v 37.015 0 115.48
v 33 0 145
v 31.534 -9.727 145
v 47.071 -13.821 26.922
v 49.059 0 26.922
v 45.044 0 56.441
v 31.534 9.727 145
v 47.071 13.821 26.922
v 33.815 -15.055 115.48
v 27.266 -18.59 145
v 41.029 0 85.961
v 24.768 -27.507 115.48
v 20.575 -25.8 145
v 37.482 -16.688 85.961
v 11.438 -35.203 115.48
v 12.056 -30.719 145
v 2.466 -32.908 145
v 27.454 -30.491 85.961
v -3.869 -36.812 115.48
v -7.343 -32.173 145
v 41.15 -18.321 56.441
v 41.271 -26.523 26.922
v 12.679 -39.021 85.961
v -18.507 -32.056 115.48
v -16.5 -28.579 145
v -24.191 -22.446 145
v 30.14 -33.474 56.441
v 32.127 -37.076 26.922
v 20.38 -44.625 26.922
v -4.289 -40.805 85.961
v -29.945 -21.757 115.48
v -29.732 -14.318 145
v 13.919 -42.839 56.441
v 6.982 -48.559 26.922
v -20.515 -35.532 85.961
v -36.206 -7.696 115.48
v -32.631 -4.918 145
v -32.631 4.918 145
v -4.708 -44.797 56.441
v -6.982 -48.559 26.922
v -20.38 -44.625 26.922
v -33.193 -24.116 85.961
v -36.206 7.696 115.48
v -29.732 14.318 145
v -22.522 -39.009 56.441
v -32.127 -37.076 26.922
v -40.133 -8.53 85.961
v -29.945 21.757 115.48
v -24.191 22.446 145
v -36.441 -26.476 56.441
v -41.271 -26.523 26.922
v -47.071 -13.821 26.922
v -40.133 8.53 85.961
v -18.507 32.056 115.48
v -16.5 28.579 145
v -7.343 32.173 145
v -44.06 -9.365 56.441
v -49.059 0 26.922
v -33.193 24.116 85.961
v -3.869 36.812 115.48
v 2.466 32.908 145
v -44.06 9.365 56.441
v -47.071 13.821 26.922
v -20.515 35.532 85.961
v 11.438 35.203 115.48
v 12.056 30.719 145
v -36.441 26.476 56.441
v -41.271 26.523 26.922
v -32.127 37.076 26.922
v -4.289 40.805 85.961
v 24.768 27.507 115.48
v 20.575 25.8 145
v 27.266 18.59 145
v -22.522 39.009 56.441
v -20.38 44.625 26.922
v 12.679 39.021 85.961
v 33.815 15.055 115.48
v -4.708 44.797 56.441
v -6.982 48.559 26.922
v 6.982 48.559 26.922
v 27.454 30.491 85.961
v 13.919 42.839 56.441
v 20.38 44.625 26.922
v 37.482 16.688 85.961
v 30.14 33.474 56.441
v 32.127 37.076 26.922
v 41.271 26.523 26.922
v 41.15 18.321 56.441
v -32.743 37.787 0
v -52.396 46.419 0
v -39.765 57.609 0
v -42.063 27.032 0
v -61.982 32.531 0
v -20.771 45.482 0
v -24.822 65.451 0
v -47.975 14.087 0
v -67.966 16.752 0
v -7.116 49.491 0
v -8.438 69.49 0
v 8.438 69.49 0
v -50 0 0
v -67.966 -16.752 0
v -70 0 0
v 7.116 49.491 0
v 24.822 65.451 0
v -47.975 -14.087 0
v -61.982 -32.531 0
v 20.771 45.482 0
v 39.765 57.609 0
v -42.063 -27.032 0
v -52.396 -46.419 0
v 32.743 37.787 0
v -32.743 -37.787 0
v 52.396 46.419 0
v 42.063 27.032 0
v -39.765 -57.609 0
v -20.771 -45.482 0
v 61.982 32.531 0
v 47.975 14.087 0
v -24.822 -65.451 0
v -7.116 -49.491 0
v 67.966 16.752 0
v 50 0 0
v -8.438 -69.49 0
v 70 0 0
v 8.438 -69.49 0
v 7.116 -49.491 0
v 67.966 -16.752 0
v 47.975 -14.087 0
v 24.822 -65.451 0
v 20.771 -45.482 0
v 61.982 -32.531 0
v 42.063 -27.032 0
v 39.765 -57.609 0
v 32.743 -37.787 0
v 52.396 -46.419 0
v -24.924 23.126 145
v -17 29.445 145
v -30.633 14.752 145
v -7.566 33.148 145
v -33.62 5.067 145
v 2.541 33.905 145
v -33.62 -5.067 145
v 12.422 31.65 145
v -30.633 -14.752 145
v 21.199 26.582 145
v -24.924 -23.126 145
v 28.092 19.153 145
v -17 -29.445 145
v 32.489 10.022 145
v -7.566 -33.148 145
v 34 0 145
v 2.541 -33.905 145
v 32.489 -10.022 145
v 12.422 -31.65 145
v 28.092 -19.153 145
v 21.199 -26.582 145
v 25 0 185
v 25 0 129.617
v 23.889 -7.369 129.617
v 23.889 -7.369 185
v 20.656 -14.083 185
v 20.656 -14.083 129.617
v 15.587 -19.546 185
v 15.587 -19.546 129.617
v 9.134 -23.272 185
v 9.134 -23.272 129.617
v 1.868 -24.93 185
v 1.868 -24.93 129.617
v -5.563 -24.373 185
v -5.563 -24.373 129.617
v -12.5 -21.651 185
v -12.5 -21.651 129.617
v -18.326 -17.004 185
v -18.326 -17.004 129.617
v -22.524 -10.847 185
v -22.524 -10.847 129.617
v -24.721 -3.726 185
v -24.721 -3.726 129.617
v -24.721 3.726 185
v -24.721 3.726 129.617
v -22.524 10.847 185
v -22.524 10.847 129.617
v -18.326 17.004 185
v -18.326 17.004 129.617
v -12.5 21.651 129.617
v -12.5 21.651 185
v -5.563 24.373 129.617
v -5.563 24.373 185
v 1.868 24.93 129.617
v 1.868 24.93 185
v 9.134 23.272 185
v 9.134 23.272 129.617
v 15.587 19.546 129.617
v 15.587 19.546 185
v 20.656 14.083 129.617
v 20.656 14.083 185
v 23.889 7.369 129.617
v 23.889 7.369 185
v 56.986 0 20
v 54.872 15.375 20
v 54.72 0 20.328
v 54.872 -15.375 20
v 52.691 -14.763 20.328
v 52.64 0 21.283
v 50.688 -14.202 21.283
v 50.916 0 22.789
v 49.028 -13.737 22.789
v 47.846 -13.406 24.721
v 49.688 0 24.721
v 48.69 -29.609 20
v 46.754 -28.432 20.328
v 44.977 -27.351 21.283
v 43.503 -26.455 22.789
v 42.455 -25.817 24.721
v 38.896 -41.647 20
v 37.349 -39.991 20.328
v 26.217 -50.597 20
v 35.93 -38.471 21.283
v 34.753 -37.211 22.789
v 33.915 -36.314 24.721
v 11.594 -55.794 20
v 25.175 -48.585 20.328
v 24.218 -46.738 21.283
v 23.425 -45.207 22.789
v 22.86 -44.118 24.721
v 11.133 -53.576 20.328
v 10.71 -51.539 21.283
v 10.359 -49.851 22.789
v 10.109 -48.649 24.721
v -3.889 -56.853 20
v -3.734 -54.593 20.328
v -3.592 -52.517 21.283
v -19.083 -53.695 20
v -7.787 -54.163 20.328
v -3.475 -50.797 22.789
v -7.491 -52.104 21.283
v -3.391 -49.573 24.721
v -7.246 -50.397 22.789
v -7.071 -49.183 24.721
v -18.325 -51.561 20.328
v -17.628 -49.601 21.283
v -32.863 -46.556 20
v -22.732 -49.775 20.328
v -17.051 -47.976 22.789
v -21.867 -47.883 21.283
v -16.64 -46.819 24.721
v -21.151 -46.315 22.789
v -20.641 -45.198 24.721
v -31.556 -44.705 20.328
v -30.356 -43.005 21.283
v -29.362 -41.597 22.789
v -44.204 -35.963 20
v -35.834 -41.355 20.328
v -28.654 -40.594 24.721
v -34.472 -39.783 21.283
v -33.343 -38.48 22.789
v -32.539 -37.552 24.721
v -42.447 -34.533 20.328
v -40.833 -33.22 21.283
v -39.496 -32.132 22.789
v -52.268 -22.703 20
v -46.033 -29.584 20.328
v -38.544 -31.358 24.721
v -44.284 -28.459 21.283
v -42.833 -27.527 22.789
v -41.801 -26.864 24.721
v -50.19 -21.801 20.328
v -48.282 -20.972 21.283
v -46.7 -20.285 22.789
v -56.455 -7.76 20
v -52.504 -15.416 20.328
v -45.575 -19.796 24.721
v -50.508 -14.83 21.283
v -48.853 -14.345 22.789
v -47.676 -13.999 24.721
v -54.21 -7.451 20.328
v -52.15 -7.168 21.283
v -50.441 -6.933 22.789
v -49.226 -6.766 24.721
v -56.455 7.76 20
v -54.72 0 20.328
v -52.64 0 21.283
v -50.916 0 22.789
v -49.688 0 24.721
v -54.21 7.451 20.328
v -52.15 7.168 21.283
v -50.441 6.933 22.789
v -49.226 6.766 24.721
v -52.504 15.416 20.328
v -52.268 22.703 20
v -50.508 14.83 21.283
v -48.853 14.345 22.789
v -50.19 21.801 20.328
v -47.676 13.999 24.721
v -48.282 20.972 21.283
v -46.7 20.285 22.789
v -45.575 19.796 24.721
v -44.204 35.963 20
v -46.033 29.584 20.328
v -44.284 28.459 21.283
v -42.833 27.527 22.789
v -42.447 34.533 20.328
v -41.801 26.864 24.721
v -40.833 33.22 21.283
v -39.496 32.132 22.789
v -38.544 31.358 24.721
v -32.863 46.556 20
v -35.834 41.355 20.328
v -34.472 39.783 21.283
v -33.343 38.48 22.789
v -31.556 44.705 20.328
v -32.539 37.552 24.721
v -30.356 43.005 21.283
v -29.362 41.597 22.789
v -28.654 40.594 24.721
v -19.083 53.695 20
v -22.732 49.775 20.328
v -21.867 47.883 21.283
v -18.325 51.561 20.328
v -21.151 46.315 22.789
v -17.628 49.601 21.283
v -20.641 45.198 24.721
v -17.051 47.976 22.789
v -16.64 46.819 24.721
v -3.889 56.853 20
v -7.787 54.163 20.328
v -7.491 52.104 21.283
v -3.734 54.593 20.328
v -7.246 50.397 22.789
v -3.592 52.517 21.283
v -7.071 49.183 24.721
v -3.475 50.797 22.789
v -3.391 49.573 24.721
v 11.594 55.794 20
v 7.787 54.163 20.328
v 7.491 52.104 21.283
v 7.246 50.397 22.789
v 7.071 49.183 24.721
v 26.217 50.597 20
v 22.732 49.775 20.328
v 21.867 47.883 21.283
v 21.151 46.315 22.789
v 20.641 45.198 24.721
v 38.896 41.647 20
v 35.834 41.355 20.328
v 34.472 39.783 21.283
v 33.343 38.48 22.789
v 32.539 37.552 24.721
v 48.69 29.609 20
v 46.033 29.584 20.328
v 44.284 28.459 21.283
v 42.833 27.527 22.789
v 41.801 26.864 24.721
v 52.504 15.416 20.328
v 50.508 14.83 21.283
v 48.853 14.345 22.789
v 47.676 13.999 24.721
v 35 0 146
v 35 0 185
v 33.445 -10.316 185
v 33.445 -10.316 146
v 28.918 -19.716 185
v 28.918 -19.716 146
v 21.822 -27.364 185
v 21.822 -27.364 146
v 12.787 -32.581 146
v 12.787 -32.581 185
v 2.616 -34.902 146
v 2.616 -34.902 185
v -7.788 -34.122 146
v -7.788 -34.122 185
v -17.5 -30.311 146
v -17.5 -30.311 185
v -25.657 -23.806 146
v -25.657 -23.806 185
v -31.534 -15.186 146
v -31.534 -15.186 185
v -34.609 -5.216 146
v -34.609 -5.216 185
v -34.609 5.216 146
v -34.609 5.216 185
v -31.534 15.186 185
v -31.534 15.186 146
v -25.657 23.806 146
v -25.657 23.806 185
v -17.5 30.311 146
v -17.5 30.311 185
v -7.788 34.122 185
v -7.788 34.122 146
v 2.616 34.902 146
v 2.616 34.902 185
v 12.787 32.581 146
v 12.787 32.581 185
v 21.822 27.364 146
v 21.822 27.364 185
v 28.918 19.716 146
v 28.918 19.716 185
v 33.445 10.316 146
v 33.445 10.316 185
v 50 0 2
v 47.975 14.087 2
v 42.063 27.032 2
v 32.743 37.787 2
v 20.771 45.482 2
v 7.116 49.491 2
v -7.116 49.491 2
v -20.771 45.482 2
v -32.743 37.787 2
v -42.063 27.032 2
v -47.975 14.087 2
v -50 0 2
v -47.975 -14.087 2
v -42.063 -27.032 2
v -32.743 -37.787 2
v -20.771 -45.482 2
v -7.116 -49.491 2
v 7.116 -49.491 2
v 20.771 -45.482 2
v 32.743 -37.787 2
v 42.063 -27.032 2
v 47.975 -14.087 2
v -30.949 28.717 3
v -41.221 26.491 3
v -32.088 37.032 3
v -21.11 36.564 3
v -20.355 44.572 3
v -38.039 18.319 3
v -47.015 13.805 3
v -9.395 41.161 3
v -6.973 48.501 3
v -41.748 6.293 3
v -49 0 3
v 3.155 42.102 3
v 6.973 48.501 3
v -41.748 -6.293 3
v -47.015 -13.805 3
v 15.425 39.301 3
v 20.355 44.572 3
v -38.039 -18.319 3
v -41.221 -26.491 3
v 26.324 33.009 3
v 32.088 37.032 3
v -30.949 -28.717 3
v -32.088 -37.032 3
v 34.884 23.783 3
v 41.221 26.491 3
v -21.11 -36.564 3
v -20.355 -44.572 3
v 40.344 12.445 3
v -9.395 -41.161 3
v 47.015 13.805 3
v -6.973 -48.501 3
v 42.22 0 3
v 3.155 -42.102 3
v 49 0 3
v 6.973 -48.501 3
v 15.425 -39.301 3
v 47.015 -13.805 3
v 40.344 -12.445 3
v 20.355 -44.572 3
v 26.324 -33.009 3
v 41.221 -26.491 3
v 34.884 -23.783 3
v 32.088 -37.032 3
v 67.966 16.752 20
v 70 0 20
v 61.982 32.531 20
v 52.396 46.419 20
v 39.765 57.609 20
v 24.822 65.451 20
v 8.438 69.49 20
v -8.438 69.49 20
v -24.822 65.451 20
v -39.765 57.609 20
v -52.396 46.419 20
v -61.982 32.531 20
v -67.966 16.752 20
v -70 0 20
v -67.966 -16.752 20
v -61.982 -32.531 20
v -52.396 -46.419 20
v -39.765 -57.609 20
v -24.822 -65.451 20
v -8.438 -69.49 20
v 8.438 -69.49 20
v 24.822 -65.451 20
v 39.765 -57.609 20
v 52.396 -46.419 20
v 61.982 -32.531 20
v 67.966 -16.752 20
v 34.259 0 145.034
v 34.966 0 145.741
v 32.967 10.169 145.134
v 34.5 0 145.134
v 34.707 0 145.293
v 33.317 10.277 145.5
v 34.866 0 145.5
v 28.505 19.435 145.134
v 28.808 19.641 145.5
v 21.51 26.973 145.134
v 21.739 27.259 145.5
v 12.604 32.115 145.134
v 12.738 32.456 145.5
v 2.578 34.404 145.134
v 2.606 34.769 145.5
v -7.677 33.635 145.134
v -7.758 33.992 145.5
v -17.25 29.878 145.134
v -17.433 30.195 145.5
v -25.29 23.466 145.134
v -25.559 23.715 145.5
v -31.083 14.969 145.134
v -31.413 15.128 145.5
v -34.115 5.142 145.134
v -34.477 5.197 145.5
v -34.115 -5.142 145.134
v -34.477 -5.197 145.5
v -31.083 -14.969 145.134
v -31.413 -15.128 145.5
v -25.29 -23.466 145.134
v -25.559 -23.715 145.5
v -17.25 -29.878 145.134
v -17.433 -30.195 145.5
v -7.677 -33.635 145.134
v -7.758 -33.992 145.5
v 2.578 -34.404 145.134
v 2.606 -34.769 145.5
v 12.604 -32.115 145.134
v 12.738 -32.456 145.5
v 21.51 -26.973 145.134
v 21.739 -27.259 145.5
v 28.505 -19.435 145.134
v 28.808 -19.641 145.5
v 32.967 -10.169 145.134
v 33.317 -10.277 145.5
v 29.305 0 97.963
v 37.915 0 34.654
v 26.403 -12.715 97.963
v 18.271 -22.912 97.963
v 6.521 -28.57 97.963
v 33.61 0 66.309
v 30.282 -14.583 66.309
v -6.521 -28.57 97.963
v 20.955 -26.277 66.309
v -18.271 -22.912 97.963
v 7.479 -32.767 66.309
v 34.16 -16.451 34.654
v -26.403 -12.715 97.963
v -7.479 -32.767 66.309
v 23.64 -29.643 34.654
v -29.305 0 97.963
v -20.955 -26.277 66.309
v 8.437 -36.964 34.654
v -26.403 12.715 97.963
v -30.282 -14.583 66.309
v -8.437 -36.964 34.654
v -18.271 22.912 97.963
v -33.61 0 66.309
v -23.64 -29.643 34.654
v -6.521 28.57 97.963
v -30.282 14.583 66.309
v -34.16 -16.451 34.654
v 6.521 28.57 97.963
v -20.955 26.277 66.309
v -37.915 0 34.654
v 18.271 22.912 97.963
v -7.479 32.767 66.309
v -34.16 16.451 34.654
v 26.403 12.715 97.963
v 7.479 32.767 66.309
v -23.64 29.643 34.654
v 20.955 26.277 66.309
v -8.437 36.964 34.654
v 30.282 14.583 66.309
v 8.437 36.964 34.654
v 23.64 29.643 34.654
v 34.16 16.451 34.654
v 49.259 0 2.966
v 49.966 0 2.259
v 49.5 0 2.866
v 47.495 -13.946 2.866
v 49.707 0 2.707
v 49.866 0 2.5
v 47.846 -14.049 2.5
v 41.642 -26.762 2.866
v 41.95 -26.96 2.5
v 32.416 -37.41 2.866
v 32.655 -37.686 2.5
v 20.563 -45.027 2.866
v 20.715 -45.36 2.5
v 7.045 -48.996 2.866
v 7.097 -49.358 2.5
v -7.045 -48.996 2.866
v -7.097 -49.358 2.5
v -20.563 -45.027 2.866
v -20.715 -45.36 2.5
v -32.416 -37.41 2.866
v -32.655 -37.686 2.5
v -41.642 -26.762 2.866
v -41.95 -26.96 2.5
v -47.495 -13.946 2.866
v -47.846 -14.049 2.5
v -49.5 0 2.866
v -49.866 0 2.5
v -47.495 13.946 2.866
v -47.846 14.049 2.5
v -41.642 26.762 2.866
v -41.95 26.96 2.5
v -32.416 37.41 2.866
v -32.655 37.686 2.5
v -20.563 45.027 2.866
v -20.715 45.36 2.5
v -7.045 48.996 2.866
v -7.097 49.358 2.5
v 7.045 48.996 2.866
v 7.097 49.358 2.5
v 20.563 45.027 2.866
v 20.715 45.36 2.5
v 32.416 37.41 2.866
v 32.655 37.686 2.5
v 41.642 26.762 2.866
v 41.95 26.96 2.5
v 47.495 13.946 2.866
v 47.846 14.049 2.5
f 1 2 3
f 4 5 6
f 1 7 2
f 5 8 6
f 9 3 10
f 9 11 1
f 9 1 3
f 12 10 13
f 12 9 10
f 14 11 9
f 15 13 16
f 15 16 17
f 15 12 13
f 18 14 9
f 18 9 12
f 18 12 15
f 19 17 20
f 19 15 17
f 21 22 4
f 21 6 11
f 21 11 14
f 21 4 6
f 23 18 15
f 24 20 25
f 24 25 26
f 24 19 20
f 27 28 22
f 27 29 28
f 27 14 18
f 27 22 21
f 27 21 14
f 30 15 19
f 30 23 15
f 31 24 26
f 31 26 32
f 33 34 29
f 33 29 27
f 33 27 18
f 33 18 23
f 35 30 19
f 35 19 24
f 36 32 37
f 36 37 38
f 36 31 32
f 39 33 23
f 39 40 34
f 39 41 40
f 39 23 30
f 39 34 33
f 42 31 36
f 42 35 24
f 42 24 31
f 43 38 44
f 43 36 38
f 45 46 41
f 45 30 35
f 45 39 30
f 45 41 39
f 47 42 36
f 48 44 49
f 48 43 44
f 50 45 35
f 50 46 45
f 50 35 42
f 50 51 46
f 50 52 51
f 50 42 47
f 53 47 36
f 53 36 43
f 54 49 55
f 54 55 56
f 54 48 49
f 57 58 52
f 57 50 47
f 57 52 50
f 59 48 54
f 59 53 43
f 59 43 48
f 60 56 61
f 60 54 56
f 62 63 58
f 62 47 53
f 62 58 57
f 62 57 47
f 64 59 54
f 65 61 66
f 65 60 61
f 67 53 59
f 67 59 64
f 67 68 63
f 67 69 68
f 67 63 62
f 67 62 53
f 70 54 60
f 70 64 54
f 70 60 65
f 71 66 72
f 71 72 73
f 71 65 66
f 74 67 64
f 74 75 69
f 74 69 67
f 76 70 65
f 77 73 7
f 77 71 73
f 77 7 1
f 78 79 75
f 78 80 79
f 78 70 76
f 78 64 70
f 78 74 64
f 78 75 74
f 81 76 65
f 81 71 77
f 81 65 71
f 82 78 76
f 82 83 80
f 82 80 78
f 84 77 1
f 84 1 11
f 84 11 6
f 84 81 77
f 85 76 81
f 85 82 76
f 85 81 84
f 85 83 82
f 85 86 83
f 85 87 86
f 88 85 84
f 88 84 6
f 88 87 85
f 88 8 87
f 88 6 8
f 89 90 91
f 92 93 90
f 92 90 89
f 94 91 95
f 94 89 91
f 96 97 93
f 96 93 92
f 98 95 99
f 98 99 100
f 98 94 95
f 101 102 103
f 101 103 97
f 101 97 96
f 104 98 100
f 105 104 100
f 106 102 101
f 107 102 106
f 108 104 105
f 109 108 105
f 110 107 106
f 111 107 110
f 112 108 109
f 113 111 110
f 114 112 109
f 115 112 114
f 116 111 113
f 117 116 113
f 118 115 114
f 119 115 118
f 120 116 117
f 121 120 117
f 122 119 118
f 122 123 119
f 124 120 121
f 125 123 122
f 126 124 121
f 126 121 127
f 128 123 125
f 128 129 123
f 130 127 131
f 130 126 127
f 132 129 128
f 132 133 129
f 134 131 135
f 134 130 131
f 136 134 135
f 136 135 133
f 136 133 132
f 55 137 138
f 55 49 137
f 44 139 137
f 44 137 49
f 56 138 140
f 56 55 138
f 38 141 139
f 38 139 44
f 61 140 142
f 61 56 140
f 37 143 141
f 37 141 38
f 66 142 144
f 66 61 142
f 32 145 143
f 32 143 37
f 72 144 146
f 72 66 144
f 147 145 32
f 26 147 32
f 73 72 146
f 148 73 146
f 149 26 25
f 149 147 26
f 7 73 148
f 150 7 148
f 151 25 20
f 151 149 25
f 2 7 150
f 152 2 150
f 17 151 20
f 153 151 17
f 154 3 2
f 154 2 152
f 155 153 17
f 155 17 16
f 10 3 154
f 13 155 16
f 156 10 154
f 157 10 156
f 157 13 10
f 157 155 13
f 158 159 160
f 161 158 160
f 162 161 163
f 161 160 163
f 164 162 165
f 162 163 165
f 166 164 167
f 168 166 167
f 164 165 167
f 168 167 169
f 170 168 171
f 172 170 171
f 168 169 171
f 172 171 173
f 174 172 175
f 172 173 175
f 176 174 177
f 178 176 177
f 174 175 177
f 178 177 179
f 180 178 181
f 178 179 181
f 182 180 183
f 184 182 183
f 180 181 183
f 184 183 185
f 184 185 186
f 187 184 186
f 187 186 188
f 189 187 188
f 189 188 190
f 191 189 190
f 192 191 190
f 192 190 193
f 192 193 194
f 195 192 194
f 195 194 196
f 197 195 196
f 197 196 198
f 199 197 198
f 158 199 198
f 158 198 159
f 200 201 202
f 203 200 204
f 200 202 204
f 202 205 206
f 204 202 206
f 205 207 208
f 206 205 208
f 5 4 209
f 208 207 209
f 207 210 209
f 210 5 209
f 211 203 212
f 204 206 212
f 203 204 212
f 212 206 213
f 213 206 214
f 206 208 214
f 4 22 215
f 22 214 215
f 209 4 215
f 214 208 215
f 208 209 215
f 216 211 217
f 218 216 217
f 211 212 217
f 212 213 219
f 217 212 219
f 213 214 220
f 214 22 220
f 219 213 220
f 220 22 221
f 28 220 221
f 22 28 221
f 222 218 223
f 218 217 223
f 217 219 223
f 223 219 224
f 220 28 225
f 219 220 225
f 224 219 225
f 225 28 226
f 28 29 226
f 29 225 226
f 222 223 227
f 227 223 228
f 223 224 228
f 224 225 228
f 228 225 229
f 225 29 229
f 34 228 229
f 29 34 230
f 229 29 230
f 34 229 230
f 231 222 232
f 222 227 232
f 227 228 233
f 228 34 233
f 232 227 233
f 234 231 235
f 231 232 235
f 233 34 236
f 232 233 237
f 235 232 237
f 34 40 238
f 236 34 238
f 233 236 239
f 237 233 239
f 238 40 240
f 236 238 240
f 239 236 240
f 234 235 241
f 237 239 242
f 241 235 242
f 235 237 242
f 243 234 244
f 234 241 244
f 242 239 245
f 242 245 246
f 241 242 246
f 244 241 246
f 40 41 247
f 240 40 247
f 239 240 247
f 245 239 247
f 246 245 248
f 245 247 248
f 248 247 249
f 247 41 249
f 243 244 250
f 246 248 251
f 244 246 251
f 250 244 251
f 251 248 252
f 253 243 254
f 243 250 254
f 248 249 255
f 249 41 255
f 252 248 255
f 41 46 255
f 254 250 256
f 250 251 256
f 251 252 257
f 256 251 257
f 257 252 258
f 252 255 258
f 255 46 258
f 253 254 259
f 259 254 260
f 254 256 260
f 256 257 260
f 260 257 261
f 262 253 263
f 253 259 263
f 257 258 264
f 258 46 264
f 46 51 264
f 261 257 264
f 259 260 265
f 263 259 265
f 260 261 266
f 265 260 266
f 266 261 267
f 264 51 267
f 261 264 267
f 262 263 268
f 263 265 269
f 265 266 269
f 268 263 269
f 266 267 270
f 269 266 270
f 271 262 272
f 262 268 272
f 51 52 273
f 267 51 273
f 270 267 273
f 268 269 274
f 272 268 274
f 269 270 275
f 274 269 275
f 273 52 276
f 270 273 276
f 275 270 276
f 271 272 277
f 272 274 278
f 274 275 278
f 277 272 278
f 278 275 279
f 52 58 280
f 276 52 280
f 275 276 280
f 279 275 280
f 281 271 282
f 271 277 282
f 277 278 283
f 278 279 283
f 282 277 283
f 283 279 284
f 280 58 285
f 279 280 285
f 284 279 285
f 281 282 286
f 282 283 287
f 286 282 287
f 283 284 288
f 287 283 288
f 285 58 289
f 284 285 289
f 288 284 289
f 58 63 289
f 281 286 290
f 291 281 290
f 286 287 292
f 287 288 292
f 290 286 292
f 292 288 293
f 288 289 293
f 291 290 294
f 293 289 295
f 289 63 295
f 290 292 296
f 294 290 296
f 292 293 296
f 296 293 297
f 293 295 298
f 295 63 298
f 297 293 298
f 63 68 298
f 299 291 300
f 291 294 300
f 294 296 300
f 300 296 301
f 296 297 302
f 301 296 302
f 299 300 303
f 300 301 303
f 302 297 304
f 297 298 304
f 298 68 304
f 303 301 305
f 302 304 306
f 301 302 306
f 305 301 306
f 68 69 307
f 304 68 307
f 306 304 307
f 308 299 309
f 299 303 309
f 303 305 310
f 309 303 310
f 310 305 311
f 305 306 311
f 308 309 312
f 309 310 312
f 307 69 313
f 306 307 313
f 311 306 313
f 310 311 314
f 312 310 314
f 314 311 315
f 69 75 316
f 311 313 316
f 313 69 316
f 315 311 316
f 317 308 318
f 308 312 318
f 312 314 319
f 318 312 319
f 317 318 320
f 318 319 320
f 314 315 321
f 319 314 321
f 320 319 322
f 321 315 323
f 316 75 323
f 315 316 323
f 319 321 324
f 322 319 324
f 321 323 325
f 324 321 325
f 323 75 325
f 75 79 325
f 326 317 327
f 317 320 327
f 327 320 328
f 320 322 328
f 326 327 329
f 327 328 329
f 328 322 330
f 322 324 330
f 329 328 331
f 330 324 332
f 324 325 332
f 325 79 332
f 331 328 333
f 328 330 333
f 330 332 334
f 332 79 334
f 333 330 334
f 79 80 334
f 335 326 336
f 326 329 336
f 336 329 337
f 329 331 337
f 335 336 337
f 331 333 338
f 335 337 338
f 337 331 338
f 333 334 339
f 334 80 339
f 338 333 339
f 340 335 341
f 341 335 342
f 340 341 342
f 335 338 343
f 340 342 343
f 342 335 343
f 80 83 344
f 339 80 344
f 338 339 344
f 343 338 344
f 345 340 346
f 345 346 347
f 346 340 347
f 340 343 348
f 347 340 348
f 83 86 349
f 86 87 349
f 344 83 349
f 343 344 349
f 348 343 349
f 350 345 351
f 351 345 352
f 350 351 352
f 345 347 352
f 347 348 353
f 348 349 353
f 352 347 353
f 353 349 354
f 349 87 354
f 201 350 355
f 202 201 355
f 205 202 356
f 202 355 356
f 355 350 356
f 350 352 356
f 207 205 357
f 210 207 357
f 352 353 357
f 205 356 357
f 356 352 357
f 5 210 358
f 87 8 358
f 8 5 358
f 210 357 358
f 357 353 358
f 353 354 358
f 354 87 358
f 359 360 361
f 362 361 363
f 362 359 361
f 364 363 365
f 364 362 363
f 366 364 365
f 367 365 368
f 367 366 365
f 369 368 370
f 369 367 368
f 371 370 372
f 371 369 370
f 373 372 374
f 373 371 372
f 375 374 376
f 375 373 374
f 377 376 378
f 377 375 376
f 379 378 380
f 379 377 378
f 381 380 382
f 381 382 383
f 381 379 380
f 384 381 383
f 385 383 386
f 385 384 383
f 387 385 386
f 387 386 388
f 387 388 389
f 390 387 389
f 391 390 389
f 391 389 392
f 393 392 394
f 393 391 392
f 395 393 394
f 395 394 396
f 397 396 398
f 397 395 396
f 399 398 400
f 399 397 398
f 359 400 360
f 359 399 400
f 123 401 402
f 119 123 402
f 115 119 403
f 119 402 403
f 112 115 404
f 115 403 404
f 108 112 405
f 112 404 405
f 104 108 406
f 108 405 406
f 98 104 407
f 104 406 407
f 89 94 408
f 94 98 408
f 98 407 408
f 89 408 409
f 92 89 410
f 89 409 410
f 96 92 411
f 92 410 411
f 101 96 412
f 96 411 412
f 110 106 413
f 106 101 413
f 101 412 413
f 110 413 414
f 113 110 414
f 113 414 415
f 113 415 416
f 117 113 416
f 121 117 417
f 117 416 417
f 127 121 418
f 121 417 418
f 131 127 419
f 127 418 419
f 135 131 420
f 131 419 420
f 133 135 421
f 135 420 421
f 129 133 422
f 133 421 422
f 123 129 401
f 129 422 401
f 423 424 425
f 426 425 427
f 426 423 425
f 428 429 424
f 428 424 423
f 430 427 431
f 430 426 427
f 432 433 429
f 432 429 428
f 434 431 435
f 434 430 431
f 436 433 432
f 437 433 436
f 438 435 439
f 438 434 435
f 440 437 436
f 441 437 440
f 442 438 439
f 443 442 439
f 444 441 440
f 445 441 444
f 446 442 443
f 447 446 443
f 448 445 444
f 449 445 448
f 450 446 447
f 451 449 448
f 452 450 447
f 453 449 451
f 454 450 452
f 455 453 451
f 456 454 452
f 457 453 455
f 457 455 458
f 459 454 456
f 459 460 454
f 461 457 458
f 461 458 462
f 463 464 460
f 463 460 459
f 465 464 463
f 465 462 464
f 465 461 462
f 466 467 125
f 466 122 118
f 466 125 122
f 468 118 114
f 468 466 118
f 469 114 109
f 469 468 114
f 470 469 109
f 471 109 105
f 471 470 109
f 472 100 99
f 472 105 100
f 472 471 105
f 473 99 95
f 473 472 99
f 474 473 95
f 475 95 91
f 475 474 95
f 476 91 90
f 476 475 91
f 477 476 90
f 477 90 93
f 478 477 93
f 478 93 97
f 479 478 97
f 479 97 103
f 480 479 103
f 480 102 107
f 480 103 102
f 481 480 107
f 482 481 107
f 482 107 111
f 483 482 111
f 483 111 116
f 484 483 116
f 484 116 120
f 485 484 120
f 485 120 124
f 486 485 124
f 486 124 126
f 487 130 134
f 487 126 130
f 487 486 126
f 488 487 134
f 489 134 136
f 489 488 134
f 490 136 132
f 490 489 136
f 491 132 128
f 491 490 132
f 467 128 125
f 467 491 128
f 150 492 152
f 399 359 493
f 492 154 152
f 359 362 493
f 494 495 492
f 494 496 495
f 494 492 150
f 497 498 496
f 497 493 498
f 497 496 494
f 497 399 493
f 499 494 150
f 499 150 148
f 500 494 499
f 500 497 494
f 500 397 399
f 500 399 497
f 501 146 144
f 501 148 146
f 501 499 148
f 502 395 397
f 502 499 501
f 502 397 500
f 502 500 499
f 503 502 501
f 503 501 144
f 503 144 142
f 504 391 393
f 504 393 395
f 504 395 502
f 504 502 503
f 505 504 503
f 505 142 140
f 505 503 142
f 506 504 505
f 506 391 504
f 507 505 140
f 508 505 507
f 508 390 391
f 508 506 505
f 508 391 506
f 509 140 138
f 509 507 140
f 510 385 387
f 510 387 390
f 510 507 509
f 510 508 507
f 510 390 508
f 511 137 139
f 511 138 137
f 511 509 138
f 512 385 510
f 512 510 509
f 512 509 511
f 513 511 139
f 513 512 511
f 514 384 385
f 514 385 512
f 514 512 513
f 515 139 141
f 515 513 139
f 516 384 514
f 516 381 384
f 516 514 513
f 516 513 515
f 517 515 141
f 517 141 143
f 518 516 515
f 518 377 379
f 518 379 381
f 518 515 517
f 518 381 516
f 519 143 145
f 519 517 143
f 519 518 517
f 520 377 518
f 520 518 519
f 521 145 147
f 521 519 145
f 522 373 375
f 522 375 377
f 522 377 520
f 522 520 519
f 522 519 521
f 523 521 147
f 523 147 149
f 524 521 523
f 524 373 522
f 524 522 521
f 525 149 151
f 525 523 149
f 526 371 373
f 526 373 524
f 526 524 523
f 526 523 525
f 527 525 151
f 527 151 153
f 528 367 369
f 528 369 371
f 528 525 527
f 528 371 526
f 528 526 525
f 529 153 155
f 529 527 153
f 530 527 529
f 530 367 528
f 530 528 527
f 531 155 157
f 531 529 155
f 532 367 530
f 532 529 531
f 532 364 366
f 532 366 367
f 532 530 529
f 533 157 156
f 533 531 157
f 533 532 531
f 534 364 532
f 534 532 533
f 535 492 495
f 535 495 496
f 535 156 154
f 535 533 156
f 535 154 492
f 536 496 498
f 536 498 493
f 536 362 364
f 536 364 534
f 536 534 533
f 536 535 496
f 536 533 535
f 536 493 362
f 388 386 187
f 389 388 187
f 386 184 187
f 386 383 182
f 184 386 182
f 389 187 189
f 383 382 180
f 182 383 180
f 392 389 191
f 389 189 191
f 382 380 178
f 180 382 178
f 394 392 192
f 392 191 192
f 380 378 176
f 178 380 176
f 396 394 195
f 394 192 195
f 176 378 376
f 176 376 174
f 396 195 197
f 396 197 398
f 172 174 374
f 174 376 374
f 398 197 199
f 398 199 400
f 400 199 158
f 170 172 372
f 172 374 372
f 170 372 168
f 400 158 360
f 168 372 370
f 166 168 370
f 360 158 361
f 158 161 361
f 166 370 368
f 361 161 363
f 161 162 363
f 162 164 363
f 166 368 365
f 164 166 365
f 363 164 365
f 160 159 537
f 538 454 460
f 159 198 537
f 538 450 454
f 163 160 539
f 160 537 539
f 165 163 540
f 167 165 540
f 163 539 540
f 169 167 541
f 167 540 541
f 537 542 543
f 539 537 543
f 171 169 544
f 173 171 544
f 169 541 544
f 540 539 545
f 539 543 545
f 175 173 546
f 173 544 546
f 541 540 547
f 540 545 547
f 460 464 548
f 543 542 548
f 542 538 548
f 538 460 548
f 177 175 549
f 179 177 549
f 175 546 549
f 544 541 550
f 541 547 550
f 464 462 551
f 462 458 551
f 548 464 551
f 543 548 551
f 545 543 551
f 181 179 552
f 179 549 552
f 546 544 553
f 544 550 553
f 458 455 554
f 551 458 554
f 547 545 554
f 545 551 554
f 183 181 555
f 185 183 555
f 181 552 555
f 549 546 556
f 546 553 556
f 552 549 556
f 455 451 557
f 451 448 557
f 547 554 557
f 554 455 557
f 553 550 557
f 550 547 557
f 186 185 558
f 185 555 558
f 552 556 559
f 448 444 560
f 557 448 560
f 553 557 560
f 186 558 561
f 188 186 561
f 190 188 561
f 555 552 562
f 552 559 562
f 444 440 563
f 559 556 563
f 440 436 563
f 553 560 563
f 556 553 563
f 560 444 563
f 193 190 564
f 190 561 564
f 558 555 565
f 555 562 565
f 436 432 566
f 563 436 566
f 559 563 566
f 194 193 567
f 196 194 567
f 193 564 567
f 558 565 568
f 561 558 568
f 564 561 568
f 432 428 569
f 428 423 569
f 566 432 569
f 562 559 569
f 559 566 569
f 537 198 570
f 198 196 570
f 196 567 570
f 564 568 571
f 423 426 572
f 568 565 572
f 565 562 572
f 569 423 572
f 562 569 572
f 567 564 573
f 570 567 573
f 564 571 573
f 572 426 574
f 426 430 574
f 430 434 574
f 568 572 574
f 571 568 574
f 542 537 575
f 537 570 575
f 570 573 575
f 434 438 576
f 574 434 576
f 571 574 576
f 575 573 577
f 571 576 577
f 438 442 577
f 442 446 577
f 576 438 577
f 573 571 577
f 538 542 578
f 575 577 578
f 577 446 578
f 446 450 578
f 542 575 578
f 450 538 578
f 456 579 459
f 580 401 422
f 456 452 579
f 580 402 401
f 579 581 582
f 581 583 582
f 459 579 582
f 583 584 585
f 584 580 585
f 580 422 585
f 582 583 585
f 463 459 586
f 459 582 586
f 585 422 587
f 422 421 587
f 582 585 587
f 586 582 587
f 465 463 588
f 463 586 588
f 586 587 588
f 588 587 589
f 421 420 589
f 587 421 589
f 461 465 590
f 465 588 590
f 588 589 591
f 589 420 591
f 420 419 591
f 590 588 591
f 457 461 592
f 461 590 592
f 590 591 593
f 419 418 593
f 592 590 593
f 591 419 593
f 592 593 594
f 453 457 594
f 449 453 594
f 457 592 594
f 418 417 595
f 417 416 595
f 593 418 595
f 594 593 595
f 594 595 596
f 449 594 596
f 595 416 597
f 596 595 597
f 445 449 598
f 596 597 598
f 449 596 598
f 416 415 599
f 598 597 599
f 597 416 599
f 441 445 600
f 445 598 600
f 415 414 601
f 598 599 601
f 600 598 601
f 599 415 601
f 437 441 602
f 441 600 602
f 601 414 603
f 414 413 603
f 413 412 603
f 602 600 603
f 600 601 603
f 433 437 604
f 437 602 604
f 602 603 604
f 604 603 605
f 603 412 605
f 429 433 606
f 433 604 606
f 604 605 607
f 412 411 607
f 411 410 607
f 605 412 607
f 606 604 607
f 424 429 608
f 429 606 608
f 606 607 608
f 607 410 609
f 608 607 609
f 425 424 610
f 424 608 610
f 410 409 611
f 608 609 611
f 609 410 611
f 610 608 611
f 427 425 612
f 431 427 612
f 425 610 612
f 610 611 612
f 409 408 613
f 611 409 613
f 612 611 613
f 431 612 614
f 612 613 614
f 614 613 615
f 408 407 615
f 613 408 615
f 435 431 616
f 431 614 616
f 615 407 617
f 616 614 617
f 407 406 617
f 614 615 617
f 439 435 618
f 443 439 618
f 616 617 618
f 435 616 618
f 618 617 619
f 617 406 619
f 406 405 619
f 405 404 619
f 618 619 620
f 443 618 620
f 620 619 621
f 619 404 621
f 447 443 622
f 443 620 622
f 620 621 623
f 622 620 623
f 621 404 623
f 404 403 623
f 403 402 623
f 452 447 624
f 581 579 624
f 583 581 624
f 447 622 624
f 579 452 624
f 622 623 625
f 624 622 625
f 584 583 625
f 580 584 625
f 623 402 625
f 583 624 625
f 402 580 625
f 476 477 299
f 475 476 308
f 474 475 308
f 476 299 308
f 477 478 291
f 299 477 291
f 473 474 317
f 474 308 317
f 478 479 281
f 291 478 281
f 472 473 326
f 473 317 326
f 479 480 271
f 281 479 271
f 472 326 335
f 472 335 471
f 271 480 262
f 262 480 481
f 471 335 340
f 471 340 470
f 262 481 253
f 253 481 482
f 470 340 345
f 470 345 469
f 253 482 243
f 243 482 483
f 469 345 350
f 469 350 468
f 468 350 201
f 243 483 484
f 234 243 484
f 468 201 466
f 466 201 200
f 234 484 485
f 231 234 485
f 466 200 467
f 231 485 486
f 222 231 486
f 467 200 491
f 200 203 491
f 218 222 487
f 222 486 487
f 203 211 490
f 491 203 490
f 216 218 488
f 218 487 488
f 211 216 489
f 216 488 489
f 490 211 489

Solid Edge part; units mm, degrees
sketch "Sketch1" plane through (0, 0, 0) normal (0, -1, 0) x (1, 0, 0)
  line L0 (25, 129.6172) -> (42.2199, 3)
  line L1 (50, 3) -> (42.2199, 3)
  line L2 (50, 0) -> (50, 3)
  line L3 (50, 0) -> (70, 0)
  line L4 (70, 0) -> (70, 20)
  line L5 (70, 20) -> (50, 20)
  line L6 (33, 145) -> (50, 20)
  line L7 (35, 145) -> (33, 145)
  line L8 (35, 185) -> (35, 145)
  line L9 (25, 185) -> (35, 185)
  line L10 (25, 185) -> (25, 129.6172)
  dimension "D1" = 50
  dimension "D2" = 70
  dimension "D3" = 25
  dimension "D4" = 35
  dimension "D5" = 185
  dimension "D6" = 3
  dimension "D7" = 20
  dimension "D8" = 20
  dimension "D9" = 40
  dimension "D10" = 10
  dimension "D11" = 2
revolve "RevolvedProtrusion1" add sketch "Sketch1" angle 360 about axis through (0, 0, 54) along (0, 0, -1)
fillet "Round1" radius 1 1 edges at (-50, 0, 3)
fillet "Round_2" radius 8 1 edges at (-50, 0, 20)
fillet "Round_3" radius 1 1 edges at (-35, 0, 145)
